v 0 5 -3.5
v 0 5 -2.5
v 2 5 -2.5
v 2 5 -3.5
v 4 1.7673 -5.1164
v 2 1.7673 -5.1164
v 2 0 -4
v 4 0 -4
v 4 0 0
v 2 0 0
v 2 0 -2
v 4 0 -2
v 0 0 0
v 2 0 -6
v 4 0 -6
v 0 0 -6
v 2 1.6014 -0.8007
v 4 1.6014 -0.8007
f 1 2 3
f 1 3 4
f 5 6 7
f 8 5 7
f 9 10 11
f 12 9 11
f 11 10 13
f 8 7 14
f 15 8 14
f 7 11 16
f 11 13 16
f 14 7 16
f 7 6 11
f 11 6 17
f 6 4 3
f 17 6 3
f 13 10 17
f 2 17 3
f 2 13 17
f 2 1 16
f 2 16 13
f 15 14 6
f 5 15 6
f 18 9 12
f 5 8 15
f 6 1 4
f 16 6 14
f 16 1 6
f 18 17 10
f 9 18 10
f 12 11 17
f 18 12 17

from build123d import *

# Parameters (mm, degrees)
BOSS_EXTRUDE1_DEPTH = 2
BOSS_EXTRUDE2_DEPTH = 2


with BuildPart() as part:
    # Sketch1 → Boss-Extrude1 (new body)
    with BuildSketch(Plane(origin=(0, 0, 0), x_dir=(0, 0, -1), z_dir=(1, 0, 0))):
        Polygon((0, 0), (2.5, 5), (3.5, 5), (6, 0), align=None)
    extrude(amount=BOSS_EXTRUDE1_DEPTH)

    # Sketch2 → Boss-Extrude2 (add)
    with BuildSketch(Plane(origin=(2, 0, 0), x_dir=(0, 0, -1), z_dir=(1, 0, 0))):
        Polygon((0, 0), (2, 0), (0.800710083, 1.601420167), align=None)
        Polygon((4, 0), (6, 0), (5.116370384, 1.767259231), align=None)
    extrude(amount=BOSS_EXTRUDE2_DEPTH)


solid = part.part
